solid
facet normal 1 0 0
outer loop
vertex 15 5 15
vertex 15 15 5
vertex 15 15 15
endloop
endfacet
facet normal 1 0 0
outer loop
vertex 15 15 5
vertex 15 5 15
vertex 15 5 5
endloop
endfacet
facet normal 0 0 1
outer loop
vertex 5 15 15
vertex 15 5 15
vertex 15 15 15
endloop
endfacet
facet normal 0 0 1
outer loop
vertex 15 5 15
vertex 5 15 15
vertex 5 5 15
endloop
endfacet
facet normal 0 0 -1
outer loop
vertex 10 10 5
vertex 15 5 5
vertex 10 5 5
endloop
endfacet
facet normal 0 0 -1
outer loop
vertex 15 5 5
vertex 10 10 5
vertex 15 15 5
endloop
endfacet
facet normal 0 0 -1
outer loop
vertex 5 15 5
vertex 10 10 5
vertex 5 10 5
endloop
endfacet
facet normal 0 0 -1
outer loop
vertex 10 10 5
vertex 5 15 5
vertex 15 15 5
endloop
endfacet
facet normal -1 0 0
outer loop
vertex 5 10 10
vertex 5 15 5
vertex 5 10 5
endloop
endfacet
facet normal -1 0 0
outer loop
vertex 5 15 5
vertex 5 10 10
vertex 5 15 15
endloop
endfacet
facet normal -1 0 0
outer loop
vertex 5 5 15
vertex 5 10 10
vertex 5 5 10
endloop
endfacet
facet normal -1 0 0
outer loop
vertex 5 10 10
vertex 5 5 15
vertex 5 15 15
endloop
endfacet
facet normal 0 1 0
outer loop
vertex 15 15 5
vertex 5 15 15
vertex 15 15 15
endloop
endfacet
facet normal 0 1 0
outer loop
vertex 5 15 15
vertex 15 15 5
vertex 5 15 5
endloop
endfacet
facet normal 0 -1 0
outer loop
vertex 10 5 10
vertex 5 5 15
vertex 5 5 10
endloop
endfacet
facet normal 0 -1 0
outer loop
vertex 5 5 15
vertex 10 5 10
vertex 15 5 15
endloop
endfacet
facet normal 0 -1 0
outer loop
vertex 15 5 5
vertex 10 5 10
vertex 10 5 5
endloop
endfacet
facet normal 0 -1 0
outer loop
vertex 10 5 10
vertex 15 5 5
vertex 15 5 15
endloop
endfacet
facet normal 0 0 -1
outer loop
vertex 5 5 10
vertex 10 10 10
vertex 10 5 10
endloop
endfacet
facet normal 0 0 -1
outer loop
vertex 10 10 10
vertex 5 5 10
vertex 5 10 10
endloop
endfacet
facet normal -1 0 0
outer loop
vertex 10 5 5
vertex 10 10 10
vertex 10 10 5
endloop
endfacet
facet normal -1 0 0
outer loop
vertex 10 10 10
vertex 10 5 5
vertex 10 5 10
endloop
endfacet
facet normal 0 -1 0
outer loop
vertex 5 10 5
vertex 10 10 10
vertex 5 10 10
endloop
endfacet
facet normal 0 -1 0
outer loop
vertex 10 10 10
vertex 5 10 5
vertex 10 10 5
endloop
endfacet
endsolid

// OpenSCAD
// A closed polyhedron whose faces all point inwards (#7201). Subtracting it
// must cut away the corner of the cube; the result is not a whole cube.
points = [[0,0,0],[10,0,0],[10,10,0],[0,10,0],[0,0,10],[10,0,10],[10,10,10],[0,10,10]];
faces = [[0,1,2,3],[4,5,1,0],[7,6,5,4],[5,6,2,1],[6,7,3,2],[7,4,0,3]];
difference() {
  translate([5, 5, 5]) cube(10);
  polyhedron(points, [for (f = faces) [for (i = [len(f) - 1 : -1 : 0]) f[i]]]);
}
